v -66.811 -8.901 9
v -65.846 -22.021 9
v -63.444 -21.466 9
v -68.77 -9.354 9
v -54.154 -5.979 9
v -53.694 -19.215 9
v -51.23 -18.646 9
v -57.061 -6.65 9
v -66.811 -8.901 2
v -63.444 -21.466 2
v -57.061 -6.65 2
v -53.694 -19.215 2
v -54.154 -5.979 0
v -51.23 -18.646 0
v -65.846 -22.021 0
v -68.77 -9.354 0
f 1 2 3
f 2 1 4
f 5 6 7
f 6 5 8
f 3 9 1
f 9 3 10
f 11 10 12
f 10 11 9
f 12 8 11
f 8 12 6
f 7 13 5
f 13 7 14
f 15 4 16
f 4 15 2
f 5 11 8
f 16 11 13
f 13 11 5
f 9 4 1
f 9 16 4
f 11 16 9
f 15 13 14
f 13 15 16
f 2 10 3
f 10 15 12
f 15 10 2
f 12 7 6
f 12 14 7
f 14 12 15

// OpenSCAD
difference () {
  union () {
    translate ([-60, -14, 9/2]) {
      rotate (a=12.999999999999998, v=[0, 0, 1]) {
        cube ([15, 13, 9], center=true);
      }
    }
  }
  union () {
    translate ([-60, -15, 11/2]) {
      rotate (a=12.999999999999998, v=[0, 0, 1]) {
        rotate (a=90.0, v=[1, 0, 0]) {
          cylinder ($fn=30, h=20, r=3, center=true);
        }
      }
    }
    translate ([-60, -15, 11/2]) {
      rotate (a=14.999999999999998, v=[0, 0, 1]) {
        cube ([10, 17, 7], center=true);
      }
    }
  }
}
